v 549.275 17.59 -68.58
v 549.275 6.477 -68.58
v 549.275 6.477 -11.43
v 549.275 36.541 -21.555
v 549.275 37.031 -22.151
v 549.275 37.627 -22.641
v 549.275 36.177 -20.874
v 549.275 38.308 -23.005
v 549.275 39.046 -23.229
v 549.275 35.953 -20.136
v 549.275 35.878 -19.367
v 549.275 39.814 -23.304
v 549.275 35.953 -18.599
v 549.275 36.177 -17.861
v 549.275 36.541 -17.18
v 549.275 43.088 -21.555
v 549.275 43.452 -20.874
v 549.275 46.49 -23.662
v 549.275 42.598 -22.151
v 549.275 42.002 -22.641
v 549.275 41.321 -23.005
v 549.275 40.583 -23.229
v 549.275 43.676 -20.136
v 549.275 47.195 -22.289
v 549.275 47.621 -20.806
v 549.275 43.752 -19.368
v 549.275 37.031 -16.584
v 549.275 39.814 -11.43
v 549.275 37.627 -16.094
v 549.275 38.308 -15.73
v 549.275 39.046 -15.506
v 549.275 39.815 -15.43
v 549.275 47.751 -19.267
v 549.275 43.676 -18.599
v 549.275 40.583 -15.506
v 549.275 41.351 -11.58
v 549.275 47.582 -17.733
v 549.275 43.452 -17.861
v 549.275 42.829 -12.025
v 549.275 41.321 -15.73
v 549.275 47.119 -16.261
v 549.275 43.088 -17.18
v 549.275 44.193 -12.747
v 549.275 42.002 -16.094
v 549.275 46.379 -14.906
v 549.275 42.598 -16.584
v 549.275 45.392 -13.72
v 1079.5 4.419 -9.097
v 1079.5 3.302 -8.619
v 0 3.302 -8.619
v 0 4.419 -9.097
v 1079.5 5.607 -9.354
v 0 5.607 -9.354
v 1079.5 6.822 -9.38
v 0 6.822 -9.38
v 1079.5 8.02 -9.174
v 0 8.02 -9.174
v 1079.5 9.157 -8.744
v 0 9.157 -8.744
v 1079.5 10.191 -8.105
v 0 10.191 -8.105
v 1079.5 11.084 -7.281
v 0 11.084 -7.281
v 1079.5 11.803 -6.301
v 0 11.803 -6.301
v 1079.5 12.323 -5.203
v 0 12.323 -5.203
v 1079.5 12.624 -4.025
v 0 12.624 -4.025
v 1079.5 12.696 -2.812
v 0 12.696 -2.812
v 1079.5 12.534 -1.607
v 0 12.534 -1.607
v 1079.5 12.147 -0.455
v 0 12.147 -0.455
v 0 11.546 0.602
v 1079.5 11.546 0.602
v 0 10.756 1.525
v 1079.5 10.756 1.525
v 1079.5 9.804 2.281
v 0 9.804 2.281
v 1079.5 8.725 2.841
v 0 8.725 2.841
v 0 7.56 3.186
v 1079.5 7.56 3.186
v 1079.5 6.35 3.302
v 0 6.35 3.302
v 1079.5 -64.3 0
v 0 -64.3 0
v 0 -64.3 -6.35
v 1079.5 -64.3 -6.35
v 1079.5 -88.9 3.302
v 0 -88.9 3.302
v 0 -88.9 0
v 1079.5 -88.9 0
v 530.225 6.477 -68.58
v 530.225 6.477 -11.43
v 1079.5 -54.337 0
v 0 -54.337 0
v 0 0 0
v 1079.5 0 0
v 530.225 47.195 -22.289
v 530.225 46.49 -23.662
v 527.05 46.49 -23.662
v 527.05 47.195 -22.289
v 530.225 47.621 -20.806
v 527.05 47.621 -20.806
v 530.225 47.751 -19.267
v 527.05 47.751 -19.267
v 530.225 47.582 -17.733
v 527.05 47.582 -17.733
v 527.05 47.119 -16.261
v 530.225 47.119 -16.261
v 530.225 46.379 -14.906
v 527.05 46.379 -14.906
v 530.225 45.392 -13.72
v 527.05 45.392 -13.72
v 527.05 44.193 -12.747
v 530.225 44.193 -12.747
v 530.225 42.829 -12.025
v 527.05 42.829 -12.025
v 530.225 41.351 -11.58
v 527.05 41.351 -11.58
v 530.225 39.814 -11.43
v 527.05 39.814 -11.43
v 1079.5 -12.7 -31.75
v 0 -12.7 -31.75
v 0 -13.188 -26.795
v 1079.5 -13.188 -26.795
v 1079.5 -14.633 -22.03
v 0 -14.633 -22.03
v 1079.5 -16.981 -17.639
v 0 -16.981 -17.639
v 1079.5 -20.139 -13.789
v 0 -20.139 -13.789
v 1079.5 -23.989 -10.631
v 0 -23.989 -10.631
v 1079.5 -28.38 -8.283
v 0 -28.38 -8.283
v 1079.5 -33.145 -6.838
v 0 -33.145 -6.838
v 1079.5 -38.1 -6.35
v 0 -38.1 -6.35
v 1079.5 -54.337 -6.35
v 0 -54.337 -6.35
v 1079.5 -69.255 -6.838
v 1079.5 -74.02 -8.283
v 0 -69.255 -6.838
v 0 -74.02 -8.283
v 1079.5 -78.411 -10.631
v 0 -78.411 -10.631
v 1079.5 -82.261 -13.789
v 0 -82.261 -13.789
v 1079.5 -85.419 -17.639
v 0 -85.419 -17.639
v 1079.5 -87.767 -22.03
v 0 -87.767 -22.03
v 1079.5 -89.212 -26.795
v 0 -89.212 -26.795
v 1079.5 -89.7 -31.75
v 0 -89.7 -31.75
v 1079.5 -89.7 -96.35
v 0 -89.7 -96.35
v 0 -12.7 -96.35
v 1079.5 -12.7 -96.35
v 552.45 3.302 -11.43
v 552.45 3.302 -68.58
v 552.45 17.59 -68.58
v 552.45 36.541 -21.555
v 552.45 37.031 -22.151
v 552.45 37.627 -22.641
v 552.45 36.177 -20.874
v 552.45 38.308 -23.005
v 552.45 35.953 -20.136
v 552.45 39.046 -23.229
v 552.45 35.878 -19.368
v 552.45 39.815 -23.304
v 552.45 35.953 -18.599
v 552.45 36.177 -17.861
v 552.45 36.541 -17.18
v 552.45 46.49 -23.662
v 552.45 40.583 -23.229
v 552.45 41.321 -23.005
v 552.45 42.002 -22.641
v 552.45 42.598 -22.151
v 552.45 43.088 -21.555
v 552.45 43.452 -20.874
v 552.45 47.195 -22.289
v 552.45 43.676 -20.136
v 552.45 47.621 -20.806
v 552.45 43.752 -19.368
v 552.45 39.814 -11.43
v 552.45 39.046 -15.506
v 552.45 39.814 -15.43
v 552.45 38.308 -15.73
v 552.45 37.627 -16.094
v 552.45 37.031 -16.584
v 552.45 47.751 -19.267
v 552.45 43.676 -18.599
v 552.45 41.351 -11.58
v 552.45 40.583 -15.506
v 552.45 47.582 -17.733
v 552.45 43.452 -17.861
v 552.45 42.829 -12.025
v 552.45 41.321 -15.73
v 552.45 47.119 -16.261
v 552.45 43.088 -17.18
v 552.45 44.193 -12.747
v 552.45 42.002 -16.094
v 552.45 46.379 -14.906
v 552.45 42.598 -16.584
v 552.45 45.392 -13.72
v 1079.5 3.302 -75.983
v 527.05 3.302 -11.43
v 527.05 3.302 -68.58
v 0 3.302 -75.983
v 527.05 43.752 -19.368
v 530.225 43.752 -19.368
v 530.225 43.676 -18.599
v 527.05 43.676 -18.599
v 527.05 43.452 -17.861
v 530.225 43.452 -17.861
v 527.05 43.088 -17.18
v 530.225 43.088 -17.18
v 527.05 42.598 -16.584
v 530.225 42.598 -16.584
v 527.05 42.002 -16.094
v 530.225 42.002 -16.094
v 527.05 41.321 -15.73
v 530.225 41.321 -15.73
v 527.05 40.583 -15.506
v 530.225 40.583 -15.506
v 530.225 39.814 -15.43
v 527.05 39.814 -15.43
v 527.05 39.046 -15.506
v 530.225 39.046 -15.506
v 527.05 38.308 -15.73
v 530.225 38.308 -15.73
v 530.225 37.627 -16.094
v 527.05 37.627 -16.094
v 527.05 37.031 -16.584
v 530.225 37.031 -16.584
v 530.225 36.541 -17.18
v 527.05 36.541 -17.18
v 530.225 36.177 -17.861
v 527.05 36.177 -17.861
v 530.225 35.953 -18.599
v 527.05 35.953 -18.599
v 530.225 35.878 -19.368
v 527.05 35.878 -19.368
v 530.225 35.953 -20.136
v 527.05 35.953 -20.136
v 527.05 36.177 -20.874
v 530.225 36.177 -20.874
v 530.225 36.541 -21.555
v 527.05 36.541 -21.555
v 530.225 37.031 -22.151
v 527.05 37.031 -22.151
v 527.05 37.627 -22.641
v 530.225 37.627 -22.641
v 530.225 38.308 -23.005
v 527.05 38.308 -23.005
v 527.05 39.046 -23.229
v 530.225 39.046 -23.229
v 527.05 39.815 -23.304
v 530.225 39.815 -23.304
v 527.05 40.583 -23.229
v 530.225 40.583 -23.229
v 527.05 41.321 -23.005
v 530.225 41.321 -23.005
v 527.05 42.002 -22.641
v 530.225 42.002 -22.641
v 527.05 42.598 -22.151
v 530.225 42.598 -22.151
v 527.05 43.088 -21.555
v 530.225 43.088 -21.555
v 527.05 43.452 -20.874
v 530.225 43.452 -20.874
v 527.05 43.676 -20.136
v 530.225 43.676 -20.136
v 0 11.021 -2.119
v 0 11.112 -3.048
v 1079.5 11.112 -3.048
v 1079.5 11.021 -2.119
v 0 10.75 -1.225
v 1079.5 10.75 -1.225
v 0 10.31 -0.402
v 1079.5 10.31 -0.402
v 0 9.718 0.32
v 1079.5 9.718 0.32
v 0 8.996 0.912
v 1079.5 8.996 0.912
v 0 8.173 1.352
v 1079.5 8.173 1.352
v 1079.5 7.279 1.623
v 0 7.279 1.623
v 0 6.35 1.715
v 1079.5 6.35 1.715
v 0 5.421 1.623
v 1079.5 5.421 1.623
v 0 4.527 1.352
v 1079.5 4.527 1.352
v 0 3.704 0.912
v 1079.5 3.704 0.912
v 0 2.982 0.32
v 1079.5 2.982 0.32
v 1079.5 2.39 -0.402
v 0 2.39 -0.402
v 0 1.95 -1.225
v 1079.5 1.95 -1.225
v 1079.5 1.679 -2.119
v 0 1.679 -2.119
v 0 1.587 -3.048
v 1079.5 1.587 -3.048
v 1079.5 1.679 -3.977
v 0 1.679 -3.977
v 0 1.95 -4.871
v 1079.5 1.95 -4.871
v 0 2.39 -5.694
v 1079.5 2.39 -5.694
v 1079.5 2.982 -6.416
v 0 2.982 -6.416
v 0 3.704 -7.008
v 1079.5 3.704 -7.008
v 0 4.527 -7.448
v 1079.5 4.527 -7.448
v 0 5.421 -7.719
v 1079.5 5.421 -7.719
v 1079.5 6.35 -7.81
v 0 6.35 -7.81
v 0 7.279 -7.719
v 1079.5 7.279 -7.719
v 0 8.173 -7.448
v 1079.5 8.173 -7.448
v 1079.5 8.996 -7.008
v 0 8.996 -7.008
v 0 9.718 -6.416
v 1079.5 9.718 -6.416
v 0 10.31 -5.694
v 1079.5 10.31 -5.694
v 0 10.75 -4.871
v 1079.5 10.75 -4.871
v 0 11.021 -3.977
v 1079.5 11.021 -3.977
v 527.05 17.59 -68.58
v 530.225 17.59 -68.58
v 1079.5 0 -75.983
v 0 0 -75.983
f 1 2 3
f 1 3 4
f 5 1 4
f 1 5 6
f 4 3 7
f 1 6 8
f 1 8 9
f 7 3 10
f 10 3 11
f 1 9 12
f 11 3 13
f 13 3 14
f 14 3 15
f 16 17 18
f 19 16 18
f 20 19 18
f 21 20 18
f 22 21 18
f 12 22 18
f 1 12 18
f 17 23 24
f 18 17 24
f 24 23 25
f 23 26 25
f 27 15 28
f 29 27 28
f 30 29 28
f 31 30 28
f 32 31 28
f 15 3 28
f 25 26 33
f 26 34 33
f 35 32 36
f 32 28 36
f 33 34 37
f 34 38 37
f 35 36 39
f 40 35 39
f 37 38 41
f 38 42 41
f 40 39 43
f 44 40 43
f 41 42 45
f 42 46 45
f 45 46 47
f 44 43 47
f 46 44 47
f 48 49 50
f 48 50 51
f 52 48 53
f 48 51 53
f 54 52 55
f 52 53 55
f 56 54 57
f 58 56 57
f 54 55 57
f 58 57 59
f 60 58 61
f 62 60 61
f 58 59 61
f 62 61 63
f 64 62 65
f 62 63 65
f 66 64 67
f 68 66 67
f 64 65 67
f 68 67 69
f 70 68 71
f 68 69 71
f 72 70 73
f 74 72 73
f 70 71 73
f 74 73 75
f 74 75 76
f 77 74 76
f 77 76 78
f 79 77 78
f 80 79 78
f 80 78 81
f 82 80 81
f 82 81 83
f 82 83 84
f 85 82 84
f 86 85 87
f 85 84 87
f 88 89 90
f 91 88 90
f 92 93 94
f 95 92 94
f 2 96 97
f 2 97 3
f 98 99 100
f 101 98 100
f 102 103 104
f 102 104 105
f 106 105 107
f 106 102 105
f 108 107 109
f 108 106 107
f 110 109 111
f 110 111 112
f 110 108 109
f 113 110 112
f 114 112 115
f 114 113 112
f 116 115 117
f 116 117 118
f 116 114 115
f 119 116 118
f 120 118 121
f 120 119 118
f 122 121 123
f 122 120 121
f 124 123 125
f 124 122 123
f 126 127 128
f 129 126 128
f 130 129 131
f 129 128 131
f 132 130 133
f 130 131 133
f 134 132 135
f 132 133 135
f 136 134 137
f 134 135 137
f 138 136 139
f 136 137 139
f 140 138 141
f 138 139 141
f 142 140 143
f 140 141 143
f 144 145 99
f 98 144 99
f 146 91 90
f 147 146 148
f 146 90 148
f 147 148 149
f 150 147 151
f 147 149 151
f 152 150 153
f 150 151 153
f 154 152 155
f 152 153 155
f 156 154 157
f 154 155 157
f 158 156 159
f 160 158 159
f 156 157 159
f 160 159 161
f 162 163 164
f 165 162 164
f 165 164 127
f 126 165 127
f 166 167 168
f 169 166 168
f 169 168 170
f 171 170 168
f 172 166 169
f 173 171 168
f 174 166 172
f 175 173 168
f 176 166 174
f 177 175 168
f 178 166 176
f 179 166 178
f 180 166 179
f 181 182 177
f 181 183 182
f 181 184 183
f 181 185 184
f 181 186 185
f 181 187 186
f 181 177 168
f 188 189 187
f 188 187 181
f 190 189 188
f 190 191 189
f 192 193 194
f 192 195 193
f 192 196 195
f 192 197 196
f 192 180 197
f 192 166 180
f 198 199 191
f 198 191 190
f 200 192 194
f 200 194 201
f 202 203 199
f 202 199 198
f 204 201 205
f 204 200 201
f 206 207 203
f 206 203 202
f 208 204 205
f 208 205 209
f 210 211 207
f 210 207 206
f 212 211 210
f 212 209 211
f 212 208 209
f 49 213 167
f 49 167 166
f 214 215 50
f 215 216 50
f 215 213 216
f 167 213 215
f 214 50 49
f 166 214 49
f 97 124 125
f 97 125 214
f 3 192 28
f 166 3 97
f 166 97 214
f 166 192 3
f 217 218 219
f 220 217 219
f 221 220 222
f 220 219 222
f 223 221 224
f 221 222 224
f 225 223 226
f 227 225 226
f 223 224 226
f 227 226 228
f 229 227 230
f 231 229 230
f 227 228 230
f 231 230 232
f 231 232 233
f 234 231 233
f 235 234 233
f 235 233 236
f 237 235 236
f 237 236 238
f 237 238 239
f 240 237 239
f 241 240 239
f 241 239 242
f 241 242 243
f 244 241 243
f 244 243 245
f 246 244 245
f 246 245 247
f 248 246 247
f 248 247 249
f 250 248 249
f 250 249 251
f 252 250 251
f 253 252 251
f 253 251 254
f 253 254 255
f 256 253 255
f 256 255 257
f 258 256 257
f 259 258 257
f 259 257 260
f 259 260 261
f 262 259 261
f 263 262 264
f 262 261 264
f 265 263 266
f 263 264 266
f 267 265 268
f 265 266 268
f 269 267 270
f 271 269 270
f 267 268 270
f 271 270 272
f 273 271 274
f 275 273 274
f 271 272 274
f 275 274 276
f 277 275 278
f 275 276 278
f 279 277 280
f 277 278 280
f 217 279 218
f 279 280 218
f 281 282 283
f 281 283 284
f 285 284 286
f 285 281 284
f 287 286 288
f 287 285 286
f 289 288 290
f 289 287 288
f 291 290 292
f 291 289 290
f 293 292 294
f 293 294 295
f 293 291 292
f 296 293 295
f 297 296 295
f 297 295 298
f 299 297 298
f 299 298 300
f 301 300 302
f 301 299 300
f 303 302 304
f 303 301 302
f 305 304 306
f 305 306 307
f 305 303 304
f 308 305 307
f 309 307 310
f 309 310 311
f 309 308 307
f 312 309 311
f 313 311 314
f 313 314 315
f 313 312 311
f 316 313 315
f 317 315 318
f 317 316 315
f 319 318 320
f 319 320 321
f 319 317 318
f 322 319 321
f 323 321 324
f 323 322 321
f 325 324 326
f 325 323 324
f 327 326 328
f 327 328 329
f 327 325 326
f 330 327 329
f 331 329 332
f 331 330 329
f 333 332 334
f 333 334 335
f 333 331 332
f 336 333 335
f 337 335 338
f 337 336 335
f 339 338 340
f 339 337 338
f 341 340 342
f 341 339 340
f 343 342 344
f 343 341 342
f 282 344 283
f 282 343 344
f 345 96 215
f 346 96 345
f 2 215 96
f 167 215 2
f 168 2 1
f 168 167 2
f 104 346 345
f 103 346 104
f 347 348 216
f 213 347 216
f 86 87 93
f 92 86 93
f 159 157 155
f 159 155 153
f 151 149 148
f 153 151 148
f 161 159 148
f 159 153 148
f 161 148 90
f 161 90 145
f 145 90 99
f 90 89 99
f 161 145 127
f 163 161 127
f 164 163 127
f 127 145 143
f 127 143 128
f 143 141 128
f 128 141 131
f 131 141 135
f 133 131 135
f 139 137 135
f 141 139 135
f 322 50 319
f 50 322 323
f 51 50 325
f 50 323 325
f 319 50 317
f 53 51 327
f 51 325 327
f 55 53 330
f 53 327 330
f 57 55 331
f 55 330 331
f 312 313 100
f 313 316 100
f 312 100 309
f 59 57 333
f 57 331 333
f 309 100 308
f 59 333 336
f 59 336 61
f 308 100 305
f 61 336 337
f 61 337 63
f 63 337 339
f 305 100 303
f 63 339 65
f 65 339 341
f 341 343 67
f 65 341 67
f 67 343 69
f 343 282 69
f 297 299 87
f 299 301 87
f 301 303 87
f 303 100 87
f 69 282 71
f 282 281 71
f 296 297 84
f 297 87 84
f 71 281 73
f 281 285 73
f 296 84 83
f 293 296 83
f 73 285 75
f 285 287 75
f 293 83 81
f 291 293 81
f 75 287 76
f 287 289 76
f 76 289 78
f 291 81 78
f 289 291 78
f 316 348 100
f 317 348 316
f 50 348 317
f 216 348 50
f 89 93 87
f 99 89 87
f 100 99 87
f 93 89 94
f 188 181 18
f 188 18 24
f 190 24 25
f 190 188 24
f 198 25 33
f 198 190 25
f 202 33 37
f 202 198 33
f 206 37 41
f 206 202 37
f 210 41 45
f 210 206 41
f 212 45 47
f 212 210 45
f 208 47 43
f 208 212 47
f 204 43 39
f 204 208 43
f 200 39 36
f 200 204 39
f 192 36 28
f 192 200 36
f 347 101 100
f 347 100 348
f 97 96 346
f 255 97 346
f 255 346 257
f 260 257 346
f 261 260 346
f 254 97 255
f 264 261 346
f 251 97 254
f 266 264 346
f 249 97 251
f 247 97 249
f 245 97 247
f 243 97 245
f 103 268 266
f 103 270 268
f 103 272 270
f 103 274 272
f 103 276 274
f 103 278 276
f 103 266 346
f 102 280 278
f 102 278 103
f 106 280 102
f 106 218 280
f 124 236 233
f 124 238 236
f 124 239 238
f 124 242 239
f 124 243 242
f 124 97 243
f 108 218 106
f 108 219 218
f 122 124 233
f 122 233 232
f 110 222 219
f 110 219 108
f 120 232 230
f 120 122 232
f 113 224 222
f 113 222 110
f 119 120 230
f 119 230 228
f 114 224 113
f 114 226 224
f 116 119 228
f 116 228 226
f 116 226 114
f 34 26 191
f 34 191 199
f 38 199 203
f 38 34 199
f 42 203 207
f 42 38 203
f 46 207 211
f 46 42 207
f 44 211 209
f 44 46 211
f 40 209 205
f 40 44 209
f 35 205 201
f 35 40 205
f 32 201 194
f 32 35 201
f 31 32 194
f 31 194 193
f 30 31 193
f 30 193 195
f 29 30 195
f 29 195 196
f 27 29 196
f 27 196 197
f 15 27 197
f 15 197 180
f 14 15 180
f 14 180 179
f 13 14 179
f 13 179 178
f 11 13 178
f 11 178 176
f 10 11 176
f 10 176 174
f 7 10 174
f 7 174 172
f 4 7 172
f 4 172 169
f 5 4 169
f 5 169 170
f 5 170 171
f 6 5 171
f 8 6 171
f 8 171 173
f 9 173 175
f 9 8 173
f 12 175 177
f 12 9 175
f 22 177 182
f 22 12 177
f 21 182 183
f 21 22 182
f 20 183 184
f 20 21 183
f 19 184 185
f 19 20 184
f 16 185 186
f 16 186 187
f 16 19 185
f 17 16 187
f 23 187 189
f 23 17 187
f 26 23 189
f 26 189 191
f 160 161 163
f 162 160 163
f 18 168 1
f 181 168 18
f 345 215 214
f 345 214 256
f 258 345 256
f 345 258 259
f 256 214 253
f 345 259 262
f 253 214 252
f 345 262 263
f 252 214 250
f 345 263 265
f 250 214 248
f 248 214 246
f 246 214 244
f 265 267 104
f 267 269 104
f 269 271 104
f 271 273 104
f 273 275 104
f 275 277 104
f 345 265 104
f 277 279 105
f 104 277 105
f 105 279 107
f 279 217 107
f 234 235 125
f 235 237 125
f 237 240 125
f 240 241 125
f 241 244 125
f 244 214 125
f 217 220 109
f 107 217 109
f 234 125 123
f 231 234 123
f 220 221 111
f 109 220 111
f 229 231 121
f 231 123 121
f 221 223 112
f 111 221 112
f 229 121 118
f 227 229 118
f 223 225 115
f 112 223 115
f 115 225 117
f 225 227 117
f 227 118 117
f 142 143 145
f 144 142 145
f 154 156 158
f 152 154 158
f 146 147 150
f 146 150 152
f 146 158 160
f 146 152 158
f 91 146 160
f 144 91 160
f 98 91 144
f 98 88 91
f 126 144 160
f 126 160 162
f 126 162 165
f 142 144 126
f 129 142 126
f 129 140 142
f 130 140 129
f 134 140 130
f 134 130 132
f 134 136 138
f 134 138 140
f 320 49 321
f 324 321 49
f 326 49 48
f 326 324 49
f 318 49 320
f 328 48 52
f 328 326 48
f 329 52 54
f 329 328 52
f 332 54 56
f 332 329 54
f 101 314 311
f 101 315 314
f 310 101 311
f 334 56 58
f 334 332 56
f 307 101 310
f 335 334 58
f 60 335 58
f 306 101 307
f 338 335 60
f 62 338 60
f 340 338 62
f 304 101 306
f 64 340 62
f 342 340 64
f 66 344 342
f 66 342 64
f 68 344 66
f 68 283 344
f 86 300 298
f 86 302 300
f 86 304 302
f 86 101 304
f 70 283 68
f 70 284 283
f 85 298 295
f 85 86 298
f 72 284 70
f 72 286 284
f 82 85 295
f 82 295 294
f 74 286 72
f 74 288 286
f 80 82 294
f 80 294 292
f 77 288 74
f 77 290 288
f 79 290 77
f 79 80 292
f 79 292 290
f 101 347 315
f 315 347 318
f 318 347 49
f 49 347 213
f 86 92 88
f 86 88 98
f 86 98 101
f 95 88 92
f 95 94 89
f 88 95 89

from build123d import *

# Parameters (mm, degrees)
F0_R          = 4.7625
F1_DEPTH      = 1079.5
F3_R          = 3.937
F4_DEPTH      = 12.7
F4_DEPTH_BACK = 12.7
F5_W          = 19.05
F5_H          = 60.4399840052
F6_DEPTH      = 84.921


# Not quite as in the source:
# - a feature names something its author has since deleted; it is built from what else it names


with BuildPart() as f1:
    # F0 (on Right) → F1 (new body)
    with BuildSketch(Plane.YZ):
        with BuildLine():
            Line((-11.938, 0), (0, 0))
            Line((0, 0), (0, -3.048))
            Line((0, -3.048), (0, -8.6186548987))
            Line((0, -8.6186548987), (0, -75.9830698371))
            Line((0, -75.9830698371), (3.302, -75.9830698371))
            Line((3.302, -75.9830698371), (3.302, -8.6186548987))
            ThreePointArc((3.302, -8.6186548987), (12.5020792667, -4.6210291468), (6.35, 3.302))
            Line((6.35, 3.302), (-88.9, 3.302))
            Line((-88.9, 3.302), (-88.9, 0))
            Line((-88.9, 0), (-76.962, 0))
            Line((-76.962, 0), (-64.3, 0))
            Line((-64.3, 0), (-64.3, -6.35))
            ThreePointArc((-64.3, -6.35), (-82.2605122421, -13.7894877579), (-89.7, -31.75))
            Line((-89.7, -31.75), (-89.7, -96.35))
            Line((-89.7, -96.35), (-12.7, -96.35))
            Line((-12.7, -96.35), (-12.7, -31.75))
            ThreePointArc((-12.7, -31.75), (-20.1394877579, -13.7894877579), (-38.1, -6.35))
            Line((-38.1, -6.35), (-54.3371811509, -6.35))
            Line((-54.3371811509, -6.35), (-54.3371811509, 0))
            Line((-54.3371811509, 0), (-11.938, 0))
        make_face()
        with Locations((6.35, -3.048)):
            Circle(F0_R, mode=Mode.SUBTRACT)
    extrude(amount=F1_DEPTH)

    # F3 (on offset) → F4 (join, two sides)
    with BuildSketch(Plane.YZ.offset(539.75)) as f4_sk:
        with BuildLine():
            Line((3.302, -11.43), (3.302, -68.58))
            Line((3.302, -68.58), (17.5895, -68.58))
            Line((17.5895, -68.58), (46.489693531, -23.6623454656))
            ThreePointArc((46.489693531, -23.6623454656), (46.7820764127, -15.5652920647), (39.8145, -11.43))
            Line((39.8145, -11.43), (3.302, -11.43))
        make_face()
        with Locations((39.8145, -19.3675)):
            Circle(F3_R, mode=Mode.SUBTRACT)
    extrude(amount=F4_DEPTH)
    extrude(f4_sk.sketch, amount=-F4_DEPTH_BACK)

    # F5 (on face) → F6 (cut, through all)
    with BuildSketch(Plane.XY.offset(-11.43)):
        with Locations((539.75, 36.6969920026)):
            Rectangle(F5_W, F5_H)
    extrude(amount=-F6_DEPTH, mode=Mode.SUBTRACT)


solid = f1.part
